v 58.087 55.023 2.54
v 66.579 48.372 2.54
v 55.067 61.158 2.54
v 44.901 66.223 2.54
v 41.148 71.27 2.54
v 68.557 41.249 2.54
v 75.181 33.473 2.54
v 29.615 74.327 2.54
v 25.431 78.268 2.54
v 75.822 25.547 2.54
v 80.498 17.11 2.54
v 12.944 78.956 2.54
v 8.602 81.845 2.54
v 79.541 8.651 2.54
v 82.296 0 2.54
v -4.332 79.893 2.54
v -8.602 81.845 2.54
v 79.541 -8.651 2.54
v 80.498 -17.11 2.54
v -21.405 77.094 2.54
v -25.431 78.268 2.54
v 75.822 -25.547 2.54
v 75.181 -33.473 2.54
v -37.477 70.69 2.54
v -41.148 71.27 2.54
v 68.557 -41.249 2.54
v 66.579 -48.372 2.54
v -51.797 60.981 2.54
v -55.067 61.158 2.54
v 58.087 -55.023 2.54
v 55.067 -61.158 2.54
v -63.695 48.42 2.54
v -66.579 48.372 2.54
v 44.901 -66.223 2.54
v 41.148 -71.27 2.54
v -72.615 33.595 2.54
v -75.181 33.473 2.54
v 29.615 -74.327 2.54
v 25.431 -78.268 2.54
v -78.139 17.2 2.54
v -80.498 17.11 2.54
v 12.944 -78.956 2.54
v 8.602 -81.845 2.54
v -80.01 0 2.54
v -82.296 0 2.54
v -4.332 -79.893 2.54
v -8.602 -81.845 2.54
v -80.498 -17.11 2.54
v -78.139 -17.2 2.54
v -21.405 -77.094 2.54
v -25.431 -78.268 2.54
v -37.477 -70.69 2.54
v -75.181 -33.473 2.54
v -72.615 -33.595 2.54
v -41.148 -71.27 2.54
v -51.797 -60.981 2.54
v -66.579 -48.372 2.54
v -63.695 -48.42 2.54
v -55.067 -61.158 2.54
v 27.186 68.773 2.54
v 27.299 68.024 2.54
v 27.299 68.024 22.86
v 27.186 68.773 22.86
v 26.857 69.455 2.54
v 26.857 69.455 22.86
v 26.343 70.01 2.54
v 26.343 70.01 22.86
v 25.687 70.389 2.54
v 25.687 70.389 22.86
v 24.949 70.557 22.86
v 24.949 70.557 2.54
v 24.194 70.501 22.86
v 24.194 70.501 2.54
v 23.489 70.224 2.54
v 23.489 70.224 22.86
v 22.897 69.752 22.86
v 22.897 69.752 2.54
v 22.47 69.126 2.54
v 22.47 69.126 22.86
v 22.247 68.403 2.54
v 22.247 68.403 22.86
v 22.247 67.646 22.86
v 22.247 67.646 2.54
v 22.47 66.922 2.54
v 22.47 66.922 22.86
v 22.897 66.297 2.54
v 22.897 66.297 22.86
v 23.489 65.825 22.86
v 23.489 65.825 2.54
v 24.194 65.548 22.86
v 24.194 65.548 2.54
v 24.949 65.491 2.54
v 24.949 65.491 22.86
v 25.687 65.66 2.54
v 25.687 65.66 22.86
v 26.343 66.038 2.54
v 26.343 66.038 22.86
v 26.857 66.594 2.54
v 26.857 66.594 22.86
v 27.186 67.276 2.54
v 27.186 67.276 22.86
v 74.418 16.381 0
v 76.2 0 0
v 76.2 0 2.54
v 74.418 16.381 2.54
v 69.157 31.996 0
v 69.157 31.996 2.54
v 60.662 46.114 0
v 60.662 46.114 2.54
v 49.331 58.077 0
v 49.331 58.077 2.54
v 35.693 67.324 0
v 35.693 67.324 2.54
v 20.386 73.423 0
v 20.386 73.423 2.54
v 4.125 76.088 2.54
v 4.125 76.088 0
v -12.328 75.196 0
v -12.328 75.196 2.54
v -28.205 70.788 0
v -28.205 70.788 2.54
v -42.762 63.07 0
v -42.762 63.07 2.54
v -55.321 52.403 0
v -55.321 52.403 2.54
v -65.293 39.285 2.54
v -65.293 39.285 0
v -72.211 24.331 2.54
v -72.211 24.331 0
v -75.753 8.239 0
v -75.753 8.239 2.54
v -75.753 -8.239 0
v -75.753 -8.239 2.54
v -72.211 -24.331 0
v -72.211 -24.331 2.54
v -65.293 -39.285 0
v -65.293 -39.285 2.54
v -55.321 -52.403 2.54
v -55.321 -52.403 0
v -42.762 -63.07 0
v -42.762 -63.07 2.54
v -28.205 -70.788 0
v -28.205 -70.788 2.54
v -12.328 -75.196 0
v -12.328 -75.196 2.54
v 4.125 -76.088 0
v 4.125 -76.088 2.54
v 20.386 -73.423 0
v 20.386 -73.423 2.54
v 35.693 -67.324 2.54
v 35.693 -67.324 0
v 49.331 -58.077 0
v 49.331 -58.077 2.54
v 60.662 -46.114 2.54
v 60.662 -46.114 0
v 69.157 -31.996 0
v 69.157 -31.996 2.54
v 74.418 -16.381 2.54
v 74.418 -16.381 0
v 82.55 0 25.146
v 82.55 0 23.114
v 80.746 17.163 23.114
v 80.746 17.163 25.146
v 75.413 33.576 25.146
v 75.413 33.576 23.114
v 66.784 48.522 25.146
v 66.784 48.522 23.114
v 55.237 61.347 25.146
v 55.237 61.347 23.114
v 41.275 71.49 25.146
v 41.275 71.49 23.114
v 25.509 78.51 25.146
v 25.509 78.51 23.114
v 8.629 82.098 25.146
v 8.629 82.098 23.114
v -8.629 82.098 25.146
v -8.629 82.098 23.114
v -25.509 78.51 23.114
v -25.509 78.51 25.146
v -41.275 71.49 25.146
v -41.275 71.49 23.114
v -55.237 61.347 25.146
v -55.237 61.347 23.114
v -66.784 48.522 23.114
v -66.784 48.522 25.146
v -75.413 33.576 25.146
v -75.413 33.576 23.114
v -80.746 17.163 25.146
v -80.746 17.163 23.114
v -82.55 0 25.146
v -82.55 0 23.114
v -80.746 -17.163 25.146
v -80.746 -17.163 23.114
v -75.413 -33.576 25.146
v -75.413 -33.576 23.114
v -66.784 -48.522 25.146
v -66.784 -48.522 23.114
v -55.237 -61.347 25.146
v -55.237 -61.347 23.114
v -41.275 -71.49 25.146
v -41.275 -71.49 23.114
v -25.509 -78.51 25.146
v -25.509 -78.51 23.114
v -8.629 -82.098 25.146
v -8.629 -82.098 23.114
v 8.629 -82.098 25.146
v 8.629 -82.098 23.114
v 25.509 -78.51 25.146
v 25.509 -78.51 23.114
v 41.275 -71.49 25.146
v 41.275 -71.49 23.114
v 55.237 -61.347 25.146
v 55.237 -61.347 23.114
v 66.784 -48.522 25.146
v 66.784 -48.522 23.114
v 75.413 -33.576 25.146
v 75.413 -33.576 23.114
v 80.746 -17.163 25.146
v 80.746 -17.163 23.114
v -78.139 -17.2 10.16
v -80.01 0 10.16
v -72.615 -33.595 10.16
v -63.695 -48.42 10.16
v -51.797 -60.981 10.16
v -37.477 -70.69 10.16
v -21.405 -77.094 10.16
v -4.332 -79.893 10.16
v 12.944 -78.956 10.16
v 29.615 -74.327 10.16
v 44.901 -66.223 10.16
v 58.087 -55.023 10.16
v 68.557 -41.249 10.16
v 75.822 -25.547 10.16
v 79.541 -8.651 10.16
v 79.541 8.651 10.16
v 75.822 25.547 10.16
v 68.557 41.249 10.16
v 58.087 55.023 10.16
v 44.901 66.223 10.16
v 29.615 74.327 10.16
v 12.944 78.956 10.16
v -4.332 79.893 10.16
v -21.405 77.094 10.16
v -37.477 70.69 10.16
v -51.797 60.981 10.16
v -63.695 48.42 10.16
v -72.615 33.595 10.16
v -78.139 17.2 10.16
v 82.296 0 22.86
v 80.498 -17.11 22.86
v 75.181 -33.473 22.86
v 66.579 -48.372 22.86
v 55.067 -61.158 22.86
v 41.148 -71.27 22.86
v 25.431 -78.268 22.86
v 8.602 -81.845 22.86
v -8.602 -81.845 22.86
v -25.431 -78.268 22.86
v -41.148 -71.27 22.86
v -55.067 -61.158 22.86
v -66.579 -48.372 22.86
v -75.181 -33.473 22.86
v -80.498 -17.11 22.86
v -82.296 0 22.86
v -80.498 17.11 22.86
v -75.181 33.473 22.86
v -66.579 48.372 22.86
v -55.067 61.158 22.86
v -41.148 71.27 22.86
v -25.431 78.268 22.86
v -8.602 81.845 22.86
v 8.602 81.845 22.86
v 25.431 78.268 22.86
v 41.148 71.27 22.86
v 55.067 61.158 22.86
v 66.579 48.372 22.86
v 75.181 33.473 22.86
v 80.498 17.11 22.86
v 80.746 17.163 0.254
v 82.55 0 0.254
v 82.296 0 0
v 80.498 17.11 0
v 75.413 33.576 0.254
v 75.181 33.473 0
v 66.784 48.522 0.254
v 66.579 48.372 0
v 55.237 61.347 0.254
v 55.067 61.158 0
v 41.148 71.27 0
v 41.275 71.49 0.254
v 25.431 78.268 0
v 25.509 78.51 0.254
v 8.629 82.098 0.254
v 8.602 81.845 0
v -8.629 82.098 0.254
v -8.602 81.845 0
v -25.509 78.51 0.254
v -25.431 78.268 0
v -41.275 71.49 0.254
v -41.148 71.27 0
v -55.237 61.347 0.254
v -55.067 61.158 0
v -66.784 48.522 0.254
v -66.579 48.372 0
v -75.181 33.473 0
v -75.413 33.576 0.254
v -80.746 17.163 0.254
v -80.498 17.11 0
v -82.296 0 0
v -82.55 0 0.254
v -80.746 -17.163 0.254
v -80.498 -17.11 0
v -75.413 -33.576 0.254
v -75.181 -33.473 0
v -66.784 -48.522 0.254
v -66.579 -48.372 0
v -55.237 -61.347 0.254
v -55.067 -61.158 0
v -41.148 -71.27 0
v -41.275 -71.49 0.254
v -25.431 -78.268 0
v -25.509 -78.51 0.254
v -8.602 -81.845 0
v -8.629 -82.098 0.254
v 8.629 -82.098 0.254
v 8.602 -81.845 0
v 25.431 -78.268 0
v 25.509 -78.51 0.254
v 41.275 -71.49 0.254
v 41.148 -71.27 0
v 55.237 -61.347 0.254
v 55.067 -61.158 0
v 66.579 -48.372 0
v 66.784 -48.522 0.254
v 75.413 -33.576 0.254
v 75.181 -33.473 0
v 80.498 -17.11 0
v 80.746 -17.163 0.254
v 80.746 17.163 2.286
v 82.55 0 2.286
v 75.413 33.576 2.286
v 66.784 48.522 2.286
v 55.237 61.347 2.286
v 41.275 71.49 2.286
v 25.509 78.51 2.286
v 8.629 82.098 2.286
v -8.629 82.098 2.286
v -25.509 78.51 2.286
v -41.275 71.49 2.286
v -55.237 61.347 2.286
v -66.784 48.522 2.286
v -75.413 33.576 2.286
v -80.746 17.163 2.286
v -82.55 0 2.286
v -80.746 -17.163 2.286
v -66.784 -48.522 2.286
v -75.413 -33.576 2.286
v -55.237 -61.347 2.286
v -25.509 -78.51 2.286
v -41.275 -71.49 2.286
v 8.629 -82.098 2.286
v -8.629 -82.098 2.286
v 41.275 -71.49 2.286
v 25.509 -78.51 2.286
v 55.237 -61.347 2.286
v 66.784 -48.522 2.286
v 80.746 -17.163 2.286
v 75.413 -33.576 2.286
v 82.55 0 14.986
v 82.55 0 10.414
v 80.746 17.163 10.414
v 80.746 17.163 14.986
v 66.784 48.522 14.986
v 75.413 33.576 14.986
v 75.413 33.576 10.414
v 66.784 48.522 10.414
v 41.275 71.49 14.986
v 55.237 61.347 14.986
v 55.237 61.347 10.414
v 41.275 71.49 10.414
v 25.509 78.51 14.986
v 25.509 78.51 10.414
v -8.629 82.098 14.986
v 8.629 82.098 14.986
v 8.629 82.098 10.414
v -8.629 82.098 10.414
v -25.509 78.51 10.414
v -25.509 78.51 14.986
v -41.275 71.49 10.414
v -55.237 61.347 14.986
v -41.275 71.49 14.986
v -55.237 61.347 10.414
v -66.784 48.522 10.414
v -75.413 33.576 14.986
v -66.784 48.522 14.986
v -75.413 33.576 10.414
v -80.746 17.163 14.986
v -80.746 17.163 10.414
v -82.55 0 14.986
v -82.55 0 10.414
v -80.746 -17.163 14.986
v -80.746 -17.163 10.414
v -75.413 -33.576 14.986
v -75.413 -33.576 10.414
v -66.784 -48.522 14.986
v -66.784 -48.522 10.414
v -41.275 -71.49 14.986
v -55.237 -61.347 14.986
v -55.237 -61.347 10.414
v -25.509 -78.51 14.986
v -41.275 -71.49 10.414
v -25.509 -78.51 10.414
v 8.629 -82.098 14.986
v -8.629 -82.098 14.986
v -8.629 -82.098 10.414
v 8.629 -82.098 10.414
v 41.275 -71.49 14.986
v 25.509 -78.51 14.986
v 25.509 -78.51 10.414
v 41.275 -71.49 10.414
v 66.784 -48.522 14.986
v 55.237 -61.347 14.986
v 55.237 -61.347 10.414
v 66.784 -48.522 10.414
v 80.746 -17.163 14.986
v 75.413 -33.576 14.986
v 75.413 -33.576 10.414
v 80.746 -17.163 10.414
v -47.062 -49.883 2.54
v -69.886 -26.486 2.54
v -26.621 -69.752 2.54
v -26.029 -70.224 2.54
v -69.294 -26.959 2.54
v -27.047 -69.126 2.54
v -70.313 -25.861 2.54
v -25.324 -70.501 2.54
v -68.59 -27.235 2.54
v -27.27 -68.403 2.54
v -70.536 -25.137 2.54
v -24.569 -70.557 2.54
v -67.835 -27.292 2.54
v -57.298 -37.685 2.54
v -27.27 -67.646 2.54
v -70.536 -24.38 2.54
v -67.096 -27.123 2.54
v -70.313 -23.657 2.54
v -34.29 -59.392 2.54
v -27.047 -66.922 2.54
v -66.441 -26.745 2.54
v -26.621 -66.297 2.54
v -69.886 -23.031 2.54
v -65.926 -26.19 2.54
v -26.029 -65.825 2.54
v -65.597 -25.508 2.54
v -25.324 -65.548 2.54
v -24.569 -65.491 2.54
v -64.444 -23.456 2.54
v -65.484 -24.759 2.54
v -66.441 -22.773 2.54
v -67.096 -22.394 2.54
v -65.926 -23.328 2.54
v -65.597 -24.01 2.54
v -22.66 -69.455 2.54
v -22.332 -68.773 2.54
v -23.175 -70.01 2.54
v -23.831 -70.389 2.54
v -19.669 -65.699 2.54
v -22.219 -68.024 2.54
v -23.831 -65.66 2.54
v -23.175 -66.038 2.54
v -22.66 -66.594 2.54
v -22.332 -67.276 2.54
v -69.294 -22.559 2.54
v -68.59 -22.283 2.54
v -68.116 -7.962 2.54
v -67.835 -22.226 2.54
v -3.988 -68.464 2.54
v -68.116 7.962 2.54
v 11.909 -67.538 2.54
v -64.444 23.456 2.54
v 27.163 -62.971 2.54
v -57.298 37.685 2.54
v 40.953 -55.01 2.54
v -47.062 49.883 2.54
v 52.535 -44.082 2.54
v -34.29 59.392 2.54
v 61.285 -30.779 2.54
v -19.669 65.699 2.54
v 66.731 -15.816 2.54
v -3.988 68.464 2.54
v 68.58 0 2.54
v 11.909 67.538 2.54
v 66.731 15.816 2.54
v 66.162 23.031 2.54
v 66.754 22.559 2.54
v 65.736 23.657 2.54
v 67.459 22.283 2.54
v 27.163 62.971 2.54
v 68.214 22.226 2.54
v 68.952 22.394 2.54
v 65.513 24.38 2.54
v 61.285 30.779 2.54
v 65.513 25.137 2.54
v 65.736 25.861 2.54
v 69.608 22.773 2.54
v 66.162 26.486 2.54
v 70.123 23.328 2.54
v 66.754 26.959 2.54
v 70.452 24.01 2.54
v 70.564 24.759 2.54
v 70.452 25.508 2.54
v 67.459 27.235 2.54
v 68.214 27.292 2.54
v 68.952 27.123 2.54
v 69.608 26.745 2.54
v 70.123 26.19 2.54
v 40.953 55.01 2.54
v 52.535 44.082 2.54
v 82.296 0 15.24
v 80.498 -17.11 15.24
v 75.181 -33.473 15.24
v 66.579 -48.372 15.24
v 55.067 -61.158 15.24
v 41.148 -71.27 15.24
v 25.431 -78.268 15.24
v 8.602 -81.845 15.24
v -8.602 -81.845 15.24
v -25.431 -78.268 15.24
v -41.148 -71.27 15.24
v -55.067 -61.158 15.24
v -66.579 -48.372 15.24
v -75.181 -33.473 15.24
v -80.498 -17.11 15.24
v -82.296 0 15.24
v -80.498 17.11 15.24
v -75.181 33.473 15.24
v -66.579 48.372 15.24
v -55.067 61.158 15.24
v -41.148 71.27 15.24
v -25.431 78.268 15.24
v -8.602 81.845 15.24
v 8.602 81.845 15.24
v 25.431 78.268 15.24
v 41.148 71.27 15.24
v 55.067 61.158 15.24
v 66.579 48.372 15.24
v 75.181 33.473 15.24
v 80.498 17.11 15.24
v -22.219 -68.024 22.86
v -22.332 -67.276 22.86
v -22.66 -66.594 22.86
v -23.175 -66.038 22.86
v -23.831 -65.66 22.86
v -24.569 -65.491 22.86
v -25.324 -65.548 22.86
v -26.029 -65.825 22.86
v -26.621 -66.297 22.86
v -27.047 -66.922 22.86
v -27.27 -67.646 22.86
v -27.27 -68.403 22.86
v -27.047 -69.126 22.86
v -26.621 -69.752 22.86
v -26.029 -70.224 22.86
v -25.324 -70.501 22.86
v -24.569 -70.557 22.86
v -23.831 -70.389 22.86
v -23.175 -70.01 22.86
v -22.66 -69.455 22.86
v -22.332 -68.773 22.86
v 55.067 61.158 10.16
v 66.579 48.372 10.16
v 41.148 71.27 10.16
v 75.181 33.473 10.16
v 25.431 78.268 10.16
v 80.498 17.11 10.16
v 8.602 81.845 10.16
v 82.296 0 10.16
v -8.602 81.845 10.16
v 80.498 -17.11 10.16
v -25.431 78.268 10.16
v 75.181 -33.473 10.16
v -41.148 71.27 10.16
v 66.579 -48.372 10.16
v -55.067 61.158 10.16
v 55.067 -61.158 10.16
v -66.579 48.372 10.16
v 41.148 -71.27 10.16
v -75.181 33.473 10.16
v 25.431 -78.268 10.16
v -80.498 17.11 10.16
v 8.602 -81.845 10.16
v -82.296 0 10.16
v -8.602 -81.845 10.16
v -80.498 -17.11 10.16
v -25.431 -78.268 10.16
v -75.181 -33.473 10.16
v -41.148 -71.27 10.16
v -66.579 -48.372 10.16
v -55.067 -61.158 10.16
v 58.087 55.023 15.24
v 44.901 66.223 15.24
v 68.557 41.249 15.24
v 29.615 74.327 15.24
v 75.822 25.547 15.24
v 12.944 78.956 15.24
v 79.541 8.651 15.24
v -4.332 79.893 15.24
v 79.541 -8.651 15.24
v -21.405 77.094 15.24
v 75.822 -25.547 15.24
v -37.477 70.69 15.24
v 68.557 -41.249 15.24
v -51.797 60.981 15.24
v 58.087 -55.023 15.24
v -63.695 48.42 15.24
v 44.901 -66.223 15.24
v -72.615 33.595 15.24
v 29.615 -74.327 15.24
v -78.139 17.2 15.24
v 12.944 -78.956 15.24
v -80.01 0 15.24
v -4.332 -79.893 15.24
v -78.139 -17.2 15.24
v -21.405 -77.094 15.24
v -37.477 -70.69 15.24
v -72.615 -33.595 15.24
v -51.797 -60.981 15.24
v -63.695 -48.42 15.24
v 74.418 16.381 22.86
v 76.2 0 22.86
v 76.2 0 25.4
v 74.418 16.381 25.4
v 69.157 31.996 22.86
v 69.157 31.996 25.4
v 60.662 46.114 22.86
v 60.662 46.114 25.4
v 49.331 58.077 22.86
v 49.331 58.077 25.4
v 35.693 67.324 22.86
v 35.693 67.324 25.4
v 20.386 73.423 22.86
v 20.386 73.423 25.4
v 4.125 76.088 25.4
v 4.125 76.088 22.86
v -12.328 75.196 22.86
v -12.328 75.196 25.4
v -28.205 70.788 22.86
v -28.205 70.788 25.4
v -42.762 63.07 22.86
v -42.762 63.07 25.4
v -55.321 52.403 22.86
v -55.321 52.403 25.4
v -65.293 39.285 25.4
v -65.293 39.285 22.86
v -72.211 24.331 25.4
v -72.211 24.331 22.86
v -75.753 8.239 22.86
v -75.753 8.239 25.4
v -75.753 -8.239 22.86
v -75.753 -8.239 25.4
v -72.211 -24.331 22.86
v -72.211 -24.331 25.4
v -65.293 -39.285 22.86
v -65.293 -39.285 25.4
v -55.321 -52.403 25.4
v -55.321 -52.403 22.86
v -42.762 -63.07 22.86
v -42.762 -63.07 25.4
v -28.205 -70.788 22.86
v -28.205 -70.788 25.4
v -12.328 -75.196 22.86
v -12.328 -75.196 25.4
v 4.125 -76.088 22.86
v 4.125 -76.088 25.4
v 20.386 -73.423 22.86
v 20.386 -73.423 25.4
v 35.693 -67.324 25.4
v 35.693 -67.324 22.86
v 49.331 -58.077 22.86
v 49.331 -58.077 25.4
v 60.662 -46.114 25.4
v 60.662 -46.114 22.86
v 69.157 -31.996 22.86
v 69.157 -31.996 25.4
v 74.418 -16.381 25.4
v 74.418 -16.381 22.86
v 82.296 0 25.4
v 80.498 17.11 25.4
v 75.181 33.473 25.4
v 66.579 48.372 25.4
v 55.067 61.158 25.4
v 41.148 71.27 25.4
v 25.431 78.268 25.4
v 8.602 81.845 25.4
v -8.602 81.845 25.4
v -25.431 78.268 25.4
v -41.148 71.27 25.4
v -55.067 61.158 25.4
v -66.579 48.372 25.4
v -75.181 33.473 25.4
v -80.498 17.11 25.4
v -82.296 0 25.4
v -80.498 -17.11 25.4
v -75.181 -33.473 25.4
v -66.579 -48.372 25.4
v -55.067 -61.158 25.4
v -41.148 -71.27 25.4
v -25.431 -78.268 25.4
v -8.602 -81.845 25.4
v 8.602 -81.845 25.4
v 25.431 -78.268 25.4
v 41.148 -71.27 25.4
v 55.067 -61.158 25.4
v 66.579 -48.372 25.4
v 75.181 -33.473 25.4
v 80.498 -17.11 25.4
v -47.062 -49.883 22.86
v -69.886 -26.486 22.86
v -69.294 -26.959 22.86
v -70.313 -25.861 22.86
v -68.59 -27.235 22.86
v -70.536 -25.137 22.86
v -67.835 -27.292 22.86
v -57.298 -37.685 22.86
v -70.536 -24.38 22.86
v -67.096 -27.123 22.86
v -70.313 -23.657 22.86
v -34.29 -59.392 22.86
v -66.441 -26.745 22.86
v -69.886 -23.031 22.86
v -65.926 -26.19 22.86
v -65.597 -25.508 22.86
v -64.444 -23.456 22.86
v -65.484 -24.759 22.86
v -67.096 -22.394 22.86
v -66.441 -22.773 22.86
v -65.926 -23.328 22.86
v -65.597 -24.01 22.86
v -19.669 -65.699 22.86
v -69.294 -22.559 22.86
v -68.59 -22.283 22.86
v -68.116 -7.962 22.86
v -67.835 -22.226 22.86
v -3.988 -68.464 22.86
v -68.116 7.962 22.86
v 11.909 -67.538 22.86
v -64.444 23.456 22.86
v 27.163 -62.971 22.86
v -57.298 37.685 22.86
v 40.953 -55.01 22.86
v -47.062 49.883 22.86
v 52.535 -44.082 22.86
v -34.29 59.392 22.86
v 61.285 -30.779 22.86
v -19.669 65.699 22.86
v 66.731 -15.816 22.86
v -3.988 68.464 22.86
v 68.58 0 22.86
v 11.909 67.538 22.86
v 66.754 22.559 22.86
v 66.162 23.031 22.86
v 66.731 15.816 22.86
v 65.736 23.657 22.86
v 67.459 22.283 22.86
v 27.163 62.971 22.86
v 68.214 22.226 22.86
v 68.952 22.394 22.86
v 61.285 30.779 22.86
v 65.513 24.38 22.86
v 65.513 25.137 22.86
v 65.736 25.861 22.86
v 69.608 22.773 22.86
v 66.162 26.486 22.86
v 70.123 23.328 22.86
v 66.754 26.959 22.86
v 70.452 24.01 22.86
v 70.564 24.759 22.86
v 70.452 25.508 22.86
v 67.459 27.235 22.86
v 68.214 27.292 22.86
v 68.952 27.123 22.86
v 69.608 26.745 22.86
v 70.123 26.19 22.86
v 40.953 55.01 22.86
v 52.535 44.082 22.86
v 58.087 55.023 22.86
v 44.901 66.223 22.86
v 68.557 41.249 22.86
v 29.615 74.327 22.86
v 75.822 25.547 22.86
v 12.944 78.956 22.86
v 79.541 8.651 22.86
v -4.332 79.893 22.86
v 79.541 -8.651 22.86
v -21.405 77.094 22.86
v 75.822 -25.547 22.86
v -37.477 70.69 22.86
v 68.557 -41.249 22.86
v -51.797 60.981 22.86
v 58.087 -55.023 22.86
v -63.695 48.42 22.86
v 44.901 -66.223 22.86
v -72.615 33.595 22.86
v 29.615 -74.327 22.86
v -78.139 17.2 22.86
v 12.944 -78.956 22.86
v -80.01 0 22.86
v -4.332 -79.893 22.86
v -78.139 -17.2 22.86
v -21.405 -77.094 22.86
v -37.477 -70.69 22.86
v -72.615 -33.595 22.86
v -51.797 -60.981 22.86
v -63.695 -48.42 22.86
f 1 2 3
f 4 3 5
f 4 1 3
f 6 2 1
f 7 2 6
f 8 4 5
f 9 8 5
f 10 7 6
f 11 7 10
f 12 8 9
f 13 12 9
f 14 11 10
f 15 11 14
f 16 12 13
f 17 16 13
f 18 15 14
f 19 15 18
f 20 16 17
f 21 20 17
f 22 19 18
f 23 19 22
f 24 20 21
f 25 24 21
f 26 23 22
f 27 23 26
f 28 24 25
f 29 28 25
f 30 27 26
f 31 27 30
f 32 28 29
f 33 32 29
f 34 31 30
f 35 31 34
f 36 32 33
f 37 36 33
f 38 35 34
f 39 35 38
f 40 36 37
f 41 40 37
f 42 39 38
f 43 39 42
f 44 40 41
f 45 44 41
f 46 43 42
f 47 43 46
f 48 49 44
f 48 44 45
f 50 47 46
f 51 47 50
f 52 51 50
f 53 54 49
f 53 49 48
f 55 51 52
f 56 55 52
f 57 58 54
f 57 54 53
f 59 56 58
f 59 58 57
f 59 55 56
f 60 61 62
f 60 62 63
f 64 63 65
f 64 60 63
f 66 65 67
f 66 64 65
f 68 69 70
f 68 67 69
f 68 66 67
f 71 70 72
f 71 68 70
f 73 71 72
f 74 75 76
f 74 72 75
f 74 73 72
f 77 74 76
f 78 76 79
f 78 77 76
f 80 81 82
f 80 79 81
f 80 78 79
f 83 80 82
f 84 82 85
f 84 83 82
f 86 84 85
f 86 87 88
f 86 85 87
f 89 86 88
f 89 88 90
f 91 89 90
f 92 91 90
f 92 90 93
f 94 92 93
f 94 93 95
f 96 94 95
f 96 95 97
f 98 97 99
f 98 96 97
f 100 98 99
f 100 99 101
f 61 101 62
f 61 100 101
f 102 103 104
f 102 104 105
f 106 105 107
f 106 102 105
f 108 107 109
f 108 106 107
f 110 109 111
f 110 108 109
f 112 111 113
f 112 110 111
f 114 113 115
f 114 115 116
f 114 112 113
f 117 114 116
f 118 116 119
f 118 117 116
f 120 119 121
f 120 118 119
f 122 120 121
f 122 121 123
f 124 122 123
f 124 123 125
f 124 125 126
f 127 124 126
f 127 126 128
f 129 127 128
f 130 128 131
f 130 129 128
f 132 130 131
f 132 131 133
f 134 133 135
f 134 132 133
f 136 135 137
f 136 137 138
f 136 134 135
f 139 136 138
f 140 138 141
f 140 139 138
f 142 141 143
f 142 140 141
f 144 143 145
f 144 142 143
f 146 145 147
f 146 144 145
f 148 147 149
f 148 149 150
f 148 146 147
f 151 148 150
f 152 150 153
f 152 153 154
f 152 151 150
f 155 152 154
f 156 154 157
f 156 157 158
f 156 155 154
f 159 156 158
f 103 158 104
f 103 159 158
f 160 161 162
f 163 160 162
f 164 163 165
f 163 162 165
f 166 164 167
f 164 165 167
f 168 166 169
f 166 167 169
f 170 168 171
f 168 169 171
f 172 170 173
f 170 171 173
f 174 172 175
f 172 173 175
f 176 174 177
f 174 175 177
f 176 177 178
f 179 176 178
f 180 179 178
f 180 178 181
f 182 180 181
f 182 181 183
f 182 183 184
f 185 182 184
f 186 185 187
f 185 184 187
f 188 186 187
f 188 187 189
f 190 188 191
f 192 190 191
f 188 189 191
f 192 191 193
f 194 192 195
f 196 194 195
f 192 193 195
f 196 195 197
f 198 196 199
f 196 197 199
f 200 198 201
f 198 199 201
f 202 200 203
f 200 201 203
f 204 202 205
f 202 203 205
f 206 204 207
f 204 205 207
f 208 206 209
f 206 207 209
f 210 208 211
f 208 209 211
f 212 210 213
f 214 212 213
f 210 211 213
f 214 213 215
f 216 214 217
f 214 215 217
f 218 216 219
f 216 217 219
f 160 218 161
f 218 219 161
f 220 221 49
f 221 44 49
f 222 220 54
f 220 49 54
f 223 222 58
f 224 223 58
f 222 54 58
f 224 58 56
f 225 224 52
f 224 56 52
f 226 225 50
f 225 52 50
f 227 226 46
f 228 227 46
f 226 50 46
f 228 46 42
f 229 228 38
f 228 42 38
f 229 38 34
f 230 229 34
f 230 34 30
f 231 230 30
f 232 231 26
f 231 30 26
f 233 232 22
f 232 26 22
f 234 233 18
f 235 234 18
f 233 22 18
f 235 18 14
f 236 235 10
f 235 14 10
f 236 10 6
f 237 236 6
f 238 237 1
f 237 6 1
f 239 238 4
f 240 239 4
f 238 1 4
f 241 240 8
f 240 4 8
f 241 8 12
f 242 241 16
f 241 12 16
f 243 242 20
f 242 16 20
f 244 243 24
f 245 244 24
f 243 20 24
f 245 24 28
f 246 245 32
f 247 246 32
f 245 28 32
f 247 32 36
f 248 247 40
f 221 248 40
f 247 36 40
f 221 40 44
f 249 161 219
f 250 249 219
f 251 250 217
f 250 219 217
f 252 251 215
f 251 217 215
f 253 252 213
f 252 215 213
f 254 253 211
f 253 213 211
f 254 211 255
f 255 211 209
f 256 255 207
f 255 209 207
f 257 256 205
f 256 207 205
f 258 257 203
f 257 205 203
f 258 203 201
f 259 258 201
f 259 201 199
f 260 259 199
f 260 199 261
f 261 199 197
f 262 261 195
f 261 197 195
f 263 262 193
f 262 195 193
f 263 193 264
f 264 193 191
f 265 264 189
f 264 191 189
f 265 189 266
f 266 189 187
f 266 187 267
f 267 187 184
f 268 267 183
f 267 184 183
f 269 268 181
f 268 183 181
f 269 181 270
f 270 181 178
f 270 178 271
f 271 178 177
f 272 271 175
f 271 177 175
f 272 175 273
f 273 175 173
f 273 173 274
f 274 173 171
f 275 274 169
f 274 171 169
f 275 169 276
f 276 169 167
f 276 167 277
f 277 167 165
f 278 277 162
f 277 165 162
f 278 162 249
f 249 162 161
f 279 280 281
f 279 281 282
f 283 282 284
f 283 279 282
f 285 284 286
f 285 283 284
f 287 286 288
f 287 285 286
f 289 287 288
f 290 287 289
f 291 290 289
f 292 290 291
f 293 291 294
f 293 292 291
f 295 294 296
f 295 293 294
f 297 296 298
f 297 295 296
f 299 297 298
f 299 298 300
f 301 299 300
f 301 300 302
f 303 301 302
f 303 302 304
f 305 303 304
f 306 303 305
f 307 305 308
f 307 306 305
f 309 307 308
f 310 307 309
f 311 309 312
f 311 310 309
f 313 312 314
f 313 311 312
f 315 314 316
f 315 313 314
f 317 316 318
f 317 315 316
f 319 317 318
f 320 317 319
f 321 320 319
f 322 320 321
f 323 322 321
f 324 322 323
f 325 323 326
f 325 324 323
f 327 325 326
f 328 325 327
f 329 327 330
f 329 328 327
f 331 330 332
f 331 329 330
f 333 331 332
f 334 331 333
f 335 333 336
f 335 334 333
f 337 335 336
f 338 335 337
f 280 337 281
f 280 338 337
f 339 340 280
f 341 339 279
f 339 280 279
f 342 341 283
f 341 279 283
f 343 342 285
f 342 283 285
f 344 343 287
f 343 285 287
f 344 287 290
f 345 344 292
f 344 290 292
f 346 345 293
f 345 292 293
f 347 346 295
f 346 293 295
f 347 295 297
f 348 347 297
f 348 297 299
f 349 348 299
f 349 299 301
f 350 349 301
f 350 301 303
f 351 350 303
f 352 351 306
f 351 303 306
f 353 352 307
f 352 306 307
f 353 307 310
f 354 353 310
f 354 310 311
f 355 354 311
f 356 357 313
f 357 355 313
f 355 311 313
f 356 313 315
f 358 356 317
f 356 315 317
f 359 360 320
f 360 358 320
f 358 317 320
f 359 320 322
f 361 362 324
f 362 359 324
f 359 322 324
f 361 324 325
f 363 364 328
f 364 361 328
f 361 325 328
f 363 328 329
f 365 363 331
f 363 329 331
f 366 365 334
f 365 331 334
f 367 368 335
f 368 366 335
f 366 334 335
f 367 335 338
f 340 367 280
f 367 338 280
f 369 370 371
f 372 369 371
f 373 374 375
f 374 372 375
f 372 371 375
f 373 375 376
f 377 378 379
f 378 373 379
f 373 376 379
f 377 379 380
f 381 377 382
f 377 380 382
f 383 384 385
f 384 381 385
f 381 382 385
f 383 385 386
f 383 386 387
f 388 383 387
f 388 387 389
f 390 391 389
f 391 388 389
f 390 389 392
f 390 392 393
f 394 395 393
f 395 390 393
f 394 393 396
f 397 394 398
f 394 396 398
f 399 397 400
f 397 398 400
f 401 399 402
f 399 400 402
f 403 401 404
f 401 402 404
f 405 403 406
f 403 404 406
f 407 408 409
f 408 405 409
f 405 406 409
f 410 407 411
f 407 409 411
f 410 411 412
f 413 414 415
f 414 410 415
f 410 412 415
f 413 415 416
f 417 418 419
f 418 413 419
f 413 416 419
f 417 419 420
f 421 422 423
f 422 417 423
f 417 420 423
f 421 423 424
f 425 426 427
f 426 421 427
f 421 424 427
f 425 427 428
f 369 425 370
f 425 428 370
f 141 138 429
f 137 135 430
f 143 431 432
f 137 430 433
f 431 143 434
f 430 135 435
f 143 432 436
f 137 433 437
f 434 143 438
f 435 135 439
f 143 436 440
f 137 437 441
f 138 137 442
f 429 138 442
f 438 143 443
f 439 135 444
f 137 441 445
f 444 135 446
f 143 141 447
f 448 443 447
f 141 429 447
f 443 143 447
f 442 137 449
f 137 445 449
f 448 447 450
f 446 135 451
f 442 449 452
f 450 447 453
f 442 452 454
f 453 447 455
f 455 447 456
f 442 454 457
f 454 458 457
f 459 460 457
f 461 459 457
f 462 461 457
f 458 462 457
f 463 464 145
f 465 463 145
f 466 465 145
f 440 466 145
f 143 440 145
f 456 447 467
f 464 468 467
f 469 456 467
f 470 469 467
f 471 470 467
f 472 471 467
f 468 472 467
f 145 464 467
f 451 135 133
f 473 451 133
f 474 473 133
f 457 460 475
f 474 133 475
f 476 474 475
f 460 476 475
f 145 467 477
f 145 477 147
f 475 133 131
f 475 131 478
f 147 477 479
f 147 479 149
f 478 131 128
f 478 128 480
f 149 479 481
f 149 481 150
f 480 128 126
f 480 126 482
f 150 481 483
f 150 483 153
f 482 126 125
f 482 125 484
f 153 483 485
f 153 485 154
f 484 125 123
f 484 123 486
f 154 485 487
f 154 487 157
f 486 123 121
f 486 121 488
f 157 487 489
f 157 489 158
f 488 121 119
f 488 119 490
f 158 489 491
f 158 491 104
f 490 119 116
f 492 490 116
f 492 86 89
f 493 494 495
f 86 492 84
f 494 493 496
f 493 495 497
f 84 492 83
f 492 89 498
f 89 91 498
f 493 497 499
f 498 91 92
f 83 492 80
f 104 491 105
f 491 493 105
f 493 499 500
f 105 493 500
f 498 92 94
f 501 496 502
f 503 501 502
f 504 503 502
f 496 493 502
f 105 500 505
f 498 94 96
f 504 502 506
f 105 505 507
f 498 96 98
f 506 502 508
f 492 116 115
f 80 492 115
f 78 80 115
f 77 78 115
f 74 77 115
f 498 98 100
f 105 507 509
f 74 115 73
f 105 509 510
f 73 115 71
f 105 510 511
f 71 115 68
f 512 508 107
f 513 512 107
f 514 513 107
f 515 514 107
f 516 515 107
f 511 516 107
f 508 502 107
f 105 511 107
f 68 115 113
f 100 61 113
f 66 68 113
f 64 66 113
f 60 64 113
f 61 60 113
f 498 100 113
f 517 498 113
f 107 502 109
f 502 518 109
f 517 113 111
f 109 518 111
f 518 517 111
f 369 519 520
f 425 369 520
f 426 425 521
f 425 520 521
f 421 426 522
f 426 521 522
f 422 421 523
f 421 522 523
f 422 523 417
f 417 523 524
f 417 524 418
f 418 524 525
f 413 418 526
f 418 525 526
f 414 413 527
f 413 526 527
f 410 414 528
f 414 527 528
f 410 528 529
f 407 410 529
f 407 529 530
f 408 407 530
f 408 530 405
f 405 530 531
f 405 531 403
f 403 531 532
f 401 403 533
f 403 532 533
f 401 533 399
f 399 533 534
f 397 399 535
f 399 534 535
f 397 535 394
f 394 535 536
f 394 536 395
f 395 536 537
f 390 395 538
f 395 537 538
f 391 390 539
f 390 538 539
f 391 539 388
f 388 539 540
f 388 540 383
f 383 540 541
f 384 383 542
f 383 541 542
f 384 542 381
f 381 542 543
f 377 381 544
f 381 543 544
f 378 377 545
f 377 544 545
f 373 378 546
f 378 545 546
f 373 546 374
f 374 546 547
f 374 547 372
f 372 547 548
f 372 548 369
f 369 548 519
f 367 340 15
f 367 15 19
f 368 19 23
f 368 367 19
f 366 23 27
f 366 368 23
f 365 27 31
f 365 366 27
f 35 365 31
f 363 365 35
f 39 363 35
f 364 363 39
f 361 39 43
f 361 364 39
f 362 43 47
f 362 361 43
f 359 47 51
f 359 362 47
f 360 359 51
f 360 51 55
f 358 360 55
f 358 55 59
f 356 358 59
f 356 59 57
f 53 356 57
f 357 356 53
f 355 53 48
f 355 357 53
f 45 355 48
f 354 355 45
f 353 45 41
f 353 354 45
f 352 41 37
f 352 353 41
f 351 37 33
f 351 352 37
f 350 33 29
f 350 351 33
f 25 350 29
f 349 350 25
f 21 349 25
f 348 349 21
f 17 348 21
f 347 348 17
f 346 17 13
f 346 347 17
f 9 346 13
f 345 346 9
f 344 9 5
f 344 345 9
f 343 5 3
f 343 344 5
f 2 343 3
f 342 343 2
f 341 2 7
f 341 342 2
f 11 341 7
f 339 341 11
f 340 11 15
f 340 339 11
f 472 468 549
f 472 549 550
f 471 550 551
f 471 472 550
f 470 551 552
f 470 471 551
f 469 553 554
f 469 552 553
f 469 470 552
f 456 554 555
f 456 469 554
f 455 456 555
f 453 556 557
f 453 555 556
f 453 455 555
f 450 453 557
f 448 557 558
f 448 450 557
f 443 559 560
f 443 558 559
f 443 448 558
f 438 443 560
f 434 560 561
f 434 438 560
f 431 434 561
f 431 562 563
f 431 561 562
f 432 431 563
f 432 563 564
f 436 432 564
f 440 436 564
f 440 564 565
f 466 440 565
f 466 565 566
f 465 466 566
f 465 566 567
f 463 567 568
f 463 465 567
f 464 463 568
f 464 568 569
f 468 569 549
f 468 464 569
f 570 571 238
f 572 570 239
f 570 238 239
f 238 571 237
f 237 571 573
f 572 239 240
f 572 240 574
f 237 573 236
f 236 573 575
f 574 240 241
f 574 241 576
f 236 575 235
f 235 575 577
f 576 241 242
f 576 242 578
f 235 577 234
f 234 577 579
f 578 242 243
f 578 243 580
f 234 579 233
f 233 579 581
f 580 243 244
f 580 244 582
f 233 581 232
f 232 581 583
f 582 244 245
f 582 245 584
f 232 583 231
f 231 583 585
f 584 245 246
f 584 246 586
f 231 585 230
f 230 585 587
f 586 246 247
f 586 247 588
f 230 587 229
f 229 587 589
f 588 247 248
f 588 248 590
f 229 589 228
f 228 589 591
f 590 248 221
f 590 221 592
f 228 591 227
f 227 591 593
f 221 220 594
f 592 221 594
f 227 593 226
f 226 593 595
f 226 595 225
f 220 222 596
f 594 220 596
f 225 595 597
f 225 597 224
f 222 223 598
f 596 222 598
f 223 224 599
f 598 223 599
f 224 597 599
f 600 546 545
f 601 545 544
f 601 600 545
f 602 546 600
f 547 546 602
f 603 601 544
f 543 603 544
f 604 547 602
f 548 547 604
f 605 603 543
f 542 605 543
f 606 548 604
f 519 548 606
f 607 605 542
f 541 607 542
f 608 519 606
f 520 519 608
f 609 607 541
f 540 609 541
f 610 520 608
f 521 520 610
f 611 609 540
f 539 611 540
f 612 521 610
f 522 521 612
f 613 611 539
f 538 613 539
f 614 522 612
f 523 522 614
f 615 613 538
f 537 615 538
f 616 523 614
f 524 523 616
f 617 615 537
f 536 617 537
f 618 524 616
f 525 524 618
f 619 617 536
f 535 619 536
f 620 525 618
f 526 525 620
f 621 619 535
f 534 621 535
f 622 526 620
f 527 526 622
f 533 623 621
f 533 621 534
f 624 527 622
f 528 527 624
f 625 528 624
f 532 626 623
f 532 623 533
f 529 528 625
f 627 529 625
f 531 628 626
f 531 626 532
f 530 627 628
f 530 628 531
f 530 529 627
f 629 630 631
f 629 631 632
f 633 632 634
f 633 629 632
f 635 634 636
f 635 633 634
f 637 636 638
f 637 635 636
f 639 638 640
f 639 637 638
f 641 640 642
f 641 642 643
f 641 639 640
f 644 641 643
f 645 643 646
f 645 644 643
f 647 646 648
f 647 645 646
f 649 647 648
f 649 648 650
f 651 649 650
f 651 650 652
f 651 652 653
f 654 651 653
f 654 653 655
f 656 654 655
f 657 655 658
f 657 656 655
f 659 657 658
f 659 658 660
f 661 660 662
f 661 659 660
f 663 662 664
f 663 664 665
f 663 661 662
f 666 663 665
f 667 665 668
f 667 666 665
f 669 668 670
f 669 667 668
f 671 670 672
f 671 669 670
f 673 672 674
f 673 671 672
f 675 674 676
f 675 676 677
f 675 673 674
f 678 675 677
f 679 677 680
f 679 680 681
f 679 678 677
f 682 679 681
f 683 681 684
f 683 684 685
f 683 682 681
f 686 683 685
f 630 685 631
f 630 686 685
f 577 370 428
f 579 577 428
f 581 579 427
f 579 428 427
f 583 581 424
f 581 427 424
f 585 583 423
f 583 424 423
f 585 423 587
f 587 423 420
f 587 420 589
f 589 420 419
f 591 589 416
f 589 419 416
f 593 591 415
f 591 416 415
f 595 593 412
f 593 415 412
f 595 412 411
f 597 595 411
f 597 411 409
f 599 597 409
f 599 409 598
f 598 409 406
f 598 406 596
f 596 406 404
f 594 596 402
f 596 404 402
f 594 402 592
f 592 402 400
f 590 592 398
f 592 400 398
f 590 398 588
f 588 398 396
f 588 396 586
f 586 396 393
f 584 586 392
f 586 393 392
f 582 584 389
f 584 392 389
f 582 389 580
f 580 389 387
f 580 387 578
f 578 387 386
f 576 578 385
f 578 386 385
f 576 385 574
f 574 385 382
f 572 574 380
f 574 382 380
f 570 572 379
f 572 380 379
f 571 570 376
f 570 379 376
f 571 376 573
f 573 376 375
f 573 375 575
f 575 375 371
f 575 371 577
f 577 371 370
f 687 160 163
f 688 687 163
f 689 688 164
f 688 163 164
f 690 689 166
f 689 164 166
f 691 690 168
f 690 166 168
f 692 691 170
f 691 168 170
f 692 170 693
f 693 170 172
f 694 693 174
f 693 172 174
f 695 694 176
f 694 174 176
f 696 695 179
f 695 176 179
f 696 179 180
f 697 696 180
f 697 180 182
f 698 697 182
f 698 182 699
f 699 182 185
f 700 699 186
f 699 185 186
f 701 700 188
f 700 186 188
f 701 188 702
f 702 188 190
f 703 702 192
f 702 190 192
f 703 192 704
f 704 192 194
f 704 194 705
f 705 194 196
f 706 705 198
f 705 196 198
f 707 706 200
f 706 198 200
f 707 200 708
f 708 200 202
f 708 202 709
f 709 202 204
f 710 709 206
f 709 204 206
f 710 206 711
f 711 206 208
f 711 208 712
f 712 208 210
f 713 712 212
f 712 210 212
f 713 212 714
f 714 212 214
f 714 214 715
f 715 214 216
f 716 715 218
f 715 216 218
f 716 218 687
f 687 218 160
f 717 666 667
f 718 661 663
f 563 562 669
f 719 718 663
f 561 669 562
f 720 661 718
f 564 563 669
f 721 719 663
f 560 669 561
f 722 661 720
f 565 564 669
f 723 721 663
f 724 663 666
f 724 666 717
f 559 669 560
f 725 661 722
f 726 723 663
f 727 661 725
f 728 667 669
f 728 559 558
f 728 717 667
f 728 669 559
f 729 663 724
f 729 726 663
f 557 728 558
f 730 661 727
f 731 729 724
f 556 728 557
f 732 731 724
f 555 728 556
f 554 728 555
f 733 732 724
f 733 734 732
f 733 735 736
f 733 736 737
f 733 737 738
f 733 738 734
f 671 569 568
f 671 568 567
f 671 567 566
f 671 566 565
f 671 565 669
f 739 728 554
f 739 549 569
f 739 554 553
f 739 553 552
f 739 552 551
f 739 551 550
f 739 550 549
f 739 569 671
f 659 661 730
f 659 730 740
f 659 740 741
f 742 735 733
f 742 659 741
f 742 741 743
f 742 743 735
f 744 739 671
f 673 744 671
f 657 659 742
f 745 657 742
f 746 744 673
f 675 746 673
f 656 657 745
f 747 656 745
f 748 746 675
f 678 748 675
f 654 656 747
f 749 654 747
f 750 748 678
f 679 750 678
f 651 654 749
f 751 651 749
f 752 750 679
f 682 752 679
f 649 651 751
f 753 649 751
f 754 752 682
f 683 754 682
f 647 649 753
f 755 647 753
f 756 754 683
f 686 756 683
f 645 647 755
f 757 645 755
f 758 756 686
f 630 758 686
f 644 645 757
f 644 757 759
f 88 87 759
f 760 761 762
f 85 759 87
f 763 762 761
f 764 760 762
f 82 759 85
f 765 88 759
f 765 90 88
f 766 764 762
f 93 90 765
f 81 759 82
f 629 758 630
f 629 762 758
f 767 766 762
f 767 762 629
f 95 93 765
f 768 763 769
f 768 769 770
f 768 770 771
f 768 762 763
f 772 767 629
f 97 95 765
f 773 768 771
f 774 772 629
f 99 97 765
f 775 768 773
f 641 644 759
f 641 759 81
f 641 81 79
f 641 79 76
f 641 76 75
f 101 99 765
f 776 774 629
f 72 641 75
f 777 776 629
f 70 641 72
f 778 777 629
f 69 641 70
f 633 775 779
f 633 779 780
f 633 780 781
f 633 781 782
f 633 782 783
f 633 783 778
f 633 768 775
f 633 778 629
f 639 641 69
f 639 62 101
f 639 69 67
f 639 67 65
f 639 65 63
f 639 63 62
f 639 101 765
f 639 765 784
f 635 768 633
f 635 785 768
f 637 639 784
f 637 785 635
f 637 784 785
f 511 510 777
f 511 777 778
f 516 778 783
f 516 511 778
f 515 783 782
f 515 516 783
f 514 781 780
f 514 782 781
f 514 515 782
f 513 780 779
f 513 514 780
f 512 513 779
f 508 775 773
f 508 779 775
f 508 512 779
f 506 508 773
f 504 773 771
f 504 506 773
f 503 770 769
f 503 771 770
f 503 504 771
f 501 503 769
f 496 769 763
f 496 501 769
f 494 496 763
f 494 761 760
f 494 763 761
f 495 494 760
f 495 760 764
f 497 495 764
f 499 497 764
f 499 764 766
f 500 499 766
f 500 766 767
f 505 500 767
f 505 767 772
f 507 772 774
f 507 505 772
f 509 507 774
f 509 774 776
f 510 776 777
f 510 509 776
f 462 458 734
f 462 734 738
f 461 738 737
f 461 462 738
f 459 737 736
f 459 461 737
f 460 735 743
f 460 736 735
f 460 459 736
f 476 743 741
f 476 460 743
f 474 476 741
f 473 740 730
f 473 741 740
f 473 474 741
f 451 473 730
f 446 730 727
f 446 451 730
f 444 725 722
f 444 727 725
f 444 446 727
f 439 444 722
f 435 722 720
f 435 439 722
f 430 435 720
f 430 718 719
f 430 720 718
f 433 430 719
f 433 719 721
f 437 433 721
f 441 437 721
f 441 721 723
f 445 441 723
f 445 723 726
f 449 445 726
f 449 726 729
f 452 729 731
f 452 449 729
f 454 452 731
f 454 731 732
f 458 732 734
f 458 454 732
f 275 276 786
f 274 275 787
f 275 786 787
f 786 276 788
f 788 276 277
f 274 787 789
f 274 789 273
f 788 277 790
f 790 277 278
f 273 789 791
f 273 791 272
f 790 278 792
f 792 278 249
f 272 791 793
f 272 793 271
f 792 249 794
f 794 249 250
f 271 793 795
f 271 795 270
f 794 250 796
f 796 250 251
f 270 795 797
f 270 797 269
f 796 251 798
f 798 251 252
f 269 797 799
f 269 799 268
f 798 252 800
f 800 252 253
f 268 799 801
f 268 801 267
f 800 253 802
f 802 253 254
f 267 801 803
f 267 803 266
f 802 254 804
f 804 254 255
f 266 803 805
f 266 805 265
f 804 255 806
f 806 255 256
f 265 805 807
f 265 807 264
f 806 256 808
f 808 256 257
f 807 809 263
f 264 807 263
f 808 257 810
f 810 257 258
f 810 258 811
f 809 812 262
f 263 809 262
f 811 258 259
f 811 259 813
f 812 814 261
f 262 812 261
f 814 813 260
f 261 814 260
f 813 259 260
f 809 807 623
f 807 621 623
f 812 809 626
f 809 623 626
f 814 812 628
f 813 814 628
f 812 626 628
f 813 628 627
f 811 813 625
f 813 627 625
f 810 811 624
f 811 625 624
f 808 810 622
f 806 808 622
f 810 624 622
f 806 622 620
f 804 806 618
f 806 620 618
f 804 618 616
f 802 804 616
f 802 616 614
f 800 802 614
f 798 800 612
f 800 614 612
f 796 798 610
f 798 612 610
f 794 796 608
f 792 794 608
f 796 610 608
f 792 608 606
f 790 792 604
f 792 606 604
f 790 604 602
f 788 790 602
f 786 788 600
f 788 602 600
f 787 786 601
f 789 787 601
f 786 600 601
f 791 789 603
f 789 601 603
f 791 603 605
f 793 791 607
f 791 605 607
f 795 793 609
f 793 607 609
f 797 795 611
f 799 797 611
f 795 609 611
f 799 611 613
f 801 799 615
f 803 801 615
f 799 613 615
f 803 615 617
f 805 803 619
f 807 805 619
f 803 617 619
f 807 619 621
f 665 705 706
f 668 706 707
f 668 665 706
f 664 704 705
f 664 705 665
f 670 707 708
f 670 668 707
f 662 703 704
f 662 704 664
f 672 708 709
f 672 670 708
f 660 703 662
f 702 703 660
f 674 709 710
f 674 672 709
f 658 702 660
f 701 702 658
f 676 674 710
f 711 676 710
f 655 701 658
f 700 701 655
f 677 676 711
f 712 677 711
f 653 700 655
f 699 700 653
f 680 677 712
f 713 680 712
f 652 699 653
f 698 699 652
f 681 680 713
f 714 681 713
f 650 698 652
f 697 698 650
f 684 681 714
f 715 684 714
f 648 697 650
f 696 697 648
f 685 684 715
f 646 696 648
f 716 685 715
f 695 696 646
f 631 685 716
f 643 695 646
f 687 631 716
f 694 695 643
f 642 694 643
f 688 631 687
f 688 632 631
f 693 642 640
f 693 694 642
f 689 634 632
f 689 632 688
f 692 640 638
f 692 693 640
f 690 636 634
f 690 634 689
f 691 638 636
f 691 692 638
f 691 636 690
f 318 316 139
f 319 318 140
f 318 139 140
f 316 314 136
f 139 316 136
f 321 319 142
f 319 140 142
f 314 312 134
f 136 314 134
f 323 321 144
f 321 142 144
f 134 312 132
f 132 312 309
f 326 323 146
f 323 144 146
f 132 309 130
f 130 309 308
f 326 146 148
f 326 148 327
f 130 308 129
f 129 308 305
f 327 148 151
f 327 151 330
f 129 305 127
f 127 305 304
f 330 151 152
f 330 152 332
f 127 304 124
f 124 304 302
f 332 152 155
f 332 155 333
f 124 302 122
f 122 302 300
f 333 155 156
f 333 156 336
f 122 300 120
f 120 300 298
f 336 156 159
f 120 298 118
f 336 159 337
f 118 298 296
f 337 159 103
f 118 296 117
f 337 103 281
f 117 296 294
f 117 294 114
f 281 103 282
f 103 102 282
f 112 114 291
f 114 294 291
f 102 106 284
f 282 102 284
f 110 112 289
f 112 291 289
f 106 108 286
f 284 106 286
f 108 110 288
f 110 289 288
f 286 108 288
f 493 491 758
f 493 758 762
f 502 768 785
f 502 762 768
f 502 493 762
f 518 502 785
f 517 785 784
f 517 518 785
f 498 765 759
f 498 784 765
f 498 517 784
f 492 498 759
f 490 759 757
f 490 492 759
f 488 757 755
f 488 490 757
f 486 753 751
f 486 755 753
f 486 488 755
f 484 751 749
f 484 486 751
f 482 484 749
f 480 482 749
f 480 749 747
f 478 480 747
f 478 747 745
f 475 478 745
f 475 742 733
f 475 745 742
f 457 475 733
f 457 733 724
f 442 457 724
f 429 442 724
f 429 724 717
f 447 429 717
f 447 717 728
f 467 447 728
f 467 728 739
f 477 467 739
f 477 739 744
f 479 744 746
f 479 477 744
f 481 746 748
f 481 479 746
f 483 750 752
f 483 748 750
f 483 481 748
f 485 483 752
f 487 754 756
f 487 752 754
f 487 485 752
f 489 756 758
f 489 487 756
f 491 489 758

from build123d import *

# Parameters (mm, degrees)
SKETCH1_R           = 82.55
BOSS_EXTRUDE1_DEPTH = 25.4
SKETCH2_R           = 68.58
CUT_EXTRUDE1_DEPTH  = 25.4
SKETCH3_R           = 76.2
CUT_EXTRUDE2_DEPTH  = 2.54
CUT_EXTRUDE3_START  = -2.54
SKETCH4_R           = 76.2
CUT_EXTRUDE3_DEPTH  = 2.54
SKETCH5_W           = 2.54
SKETCH5_H           = 7.62
CHAMFER1_SIZE       = 0.254
CHAMFER2_SIZE       = 0.254
CHAMFER3_SIZE       = 0.254
CHAMFER4_SIZE       = 0.254
CHAMFER5_SIZE       = 0.254
CHAMFER6_SIZE       = 0.254
SKETCH6_R           = 2.54
CUT_EXTRUDE4_DEPTH  = 120.474537036


with BuildPart() as part:
    # Sketch1 → Boss-Extrude1 (new body)
    with BuildSketch(Plane.XY):
        Circle(SKETCH1_R)
    extrude(amount=BOSS_EXTRUDE1_DEPTH)

    # Sketch2 → Cut-Extrude1 (cut)
    with BuildSketch(Plane.XY):
        Circle(SKETCH2_R)
    extrude(amount=CUT_EXTRUDE1_DEPTH, mode=Mode.SUBTRACT)

    # Sketch3 → Cut-Extrude2 (cut)
    with BuildSketch(Plane.XY):
        Circle(SKETCH3_R)
    extrude(amount=CUT_EXTRUDE2_DEPTH, mode=Mode.SUBTRACT)

    # Sketch4 → Cut-Extrude3 (cut)
    with BuildSketch(Plane.XY.offset(25.4).offset(CUT_EXTRUDE3_START)):
        Circle(SKETCH4_R)
    extrude(amount=CUT_EXTRUDE3_DEPTH, mode=Mode.SUBTRACT)

    # Sketch5 → Cut-Revolve1 (revolve, cut)
    with BuildSketch(Plane(origin=(0, 0, 0), x_dir=(1, 0, 0), z_dir=(0, 1, 0))):
        with Locations((-81.28, -6.35)):
            Rectangle(SKETCH5_W, SKETCH5_H)
        with Locations((-81.28, -19.05)):
            Rectangle(SKETCH5_W, SKETCH5_H)
    revolve(axis=Axis((0, 0, 0), (0, 0, 1)), mode=Mode.SUBTRACT)

    # Chamfer1
    chamfer1_edges = [part.edges().sort_by_distance(p)[0] for p in [
        (-82.55, 0, 10.16),
    ]]
    chamfer(chamfer1_edges, length=CHAMFER1_SIZE)

    # Chamfer2
    chamfer2_edges = [part.edges().sort_by_distance(p)[0] for p in [
        (-82.55, 0, 15.24),
    ]]
    chamfer(chamfer2_edges, length=CHAMFER2_SIZE)

    # Chamfer3
    chamfer3_edges = [part.edges().sort_by_distance(p)[0] for p in [
        (-82.55, 0, 2.54),
    ]]
    chamfer(chamfer3_edges, length=CHAMFER3_SIZE)

    # Chamfer4
    chamfer4_edges = [part.edges().sort_by_distance(p)[0] for p in [
        (-82.55, 0, 22.86),
    ]]
    chamfer(chamfer4_edges, length=CHAMFER4_SIZE)

    # Chamfer5
    chamfer5_edges = [part.edges().sort_by_distance(p)[0] for p in [
        (-82.55, 0, 0),
    ]]
    chamfer(chamfer5_edges, length=CHAMFER5_SIZE)

    # Chamfer6
    chamfer6_edges = [part.edges().sort_by_distance(p)[0] for p in [
        (-82.55, 0, 25.4),
    ]]
    chamfer(chamfer6_edges, length=CHAMFER6_SIZE)

    # Sketch6 → Cut-Extrude4 (cut, through all)
    with BuildSketch(Plane.XY):
        with Locations((68.024348819, 24.758838175)):
            Circle(SKETCH6_R)
        with Locations((-68.024348819, -24.758838175)):
            Circle(SKETCH6_R)
        with Locations((24.758838175, 68.024348819)):
            Circle(SKETCH6_R)
        with Locations((-24.758838175, -68.024348819)):
            Circle(SKETCH6_R)
    extrude(amount=CUT_EXTRUDE4_DEPTH, mode=Mode.SUBTRACT)


solid = part.part
